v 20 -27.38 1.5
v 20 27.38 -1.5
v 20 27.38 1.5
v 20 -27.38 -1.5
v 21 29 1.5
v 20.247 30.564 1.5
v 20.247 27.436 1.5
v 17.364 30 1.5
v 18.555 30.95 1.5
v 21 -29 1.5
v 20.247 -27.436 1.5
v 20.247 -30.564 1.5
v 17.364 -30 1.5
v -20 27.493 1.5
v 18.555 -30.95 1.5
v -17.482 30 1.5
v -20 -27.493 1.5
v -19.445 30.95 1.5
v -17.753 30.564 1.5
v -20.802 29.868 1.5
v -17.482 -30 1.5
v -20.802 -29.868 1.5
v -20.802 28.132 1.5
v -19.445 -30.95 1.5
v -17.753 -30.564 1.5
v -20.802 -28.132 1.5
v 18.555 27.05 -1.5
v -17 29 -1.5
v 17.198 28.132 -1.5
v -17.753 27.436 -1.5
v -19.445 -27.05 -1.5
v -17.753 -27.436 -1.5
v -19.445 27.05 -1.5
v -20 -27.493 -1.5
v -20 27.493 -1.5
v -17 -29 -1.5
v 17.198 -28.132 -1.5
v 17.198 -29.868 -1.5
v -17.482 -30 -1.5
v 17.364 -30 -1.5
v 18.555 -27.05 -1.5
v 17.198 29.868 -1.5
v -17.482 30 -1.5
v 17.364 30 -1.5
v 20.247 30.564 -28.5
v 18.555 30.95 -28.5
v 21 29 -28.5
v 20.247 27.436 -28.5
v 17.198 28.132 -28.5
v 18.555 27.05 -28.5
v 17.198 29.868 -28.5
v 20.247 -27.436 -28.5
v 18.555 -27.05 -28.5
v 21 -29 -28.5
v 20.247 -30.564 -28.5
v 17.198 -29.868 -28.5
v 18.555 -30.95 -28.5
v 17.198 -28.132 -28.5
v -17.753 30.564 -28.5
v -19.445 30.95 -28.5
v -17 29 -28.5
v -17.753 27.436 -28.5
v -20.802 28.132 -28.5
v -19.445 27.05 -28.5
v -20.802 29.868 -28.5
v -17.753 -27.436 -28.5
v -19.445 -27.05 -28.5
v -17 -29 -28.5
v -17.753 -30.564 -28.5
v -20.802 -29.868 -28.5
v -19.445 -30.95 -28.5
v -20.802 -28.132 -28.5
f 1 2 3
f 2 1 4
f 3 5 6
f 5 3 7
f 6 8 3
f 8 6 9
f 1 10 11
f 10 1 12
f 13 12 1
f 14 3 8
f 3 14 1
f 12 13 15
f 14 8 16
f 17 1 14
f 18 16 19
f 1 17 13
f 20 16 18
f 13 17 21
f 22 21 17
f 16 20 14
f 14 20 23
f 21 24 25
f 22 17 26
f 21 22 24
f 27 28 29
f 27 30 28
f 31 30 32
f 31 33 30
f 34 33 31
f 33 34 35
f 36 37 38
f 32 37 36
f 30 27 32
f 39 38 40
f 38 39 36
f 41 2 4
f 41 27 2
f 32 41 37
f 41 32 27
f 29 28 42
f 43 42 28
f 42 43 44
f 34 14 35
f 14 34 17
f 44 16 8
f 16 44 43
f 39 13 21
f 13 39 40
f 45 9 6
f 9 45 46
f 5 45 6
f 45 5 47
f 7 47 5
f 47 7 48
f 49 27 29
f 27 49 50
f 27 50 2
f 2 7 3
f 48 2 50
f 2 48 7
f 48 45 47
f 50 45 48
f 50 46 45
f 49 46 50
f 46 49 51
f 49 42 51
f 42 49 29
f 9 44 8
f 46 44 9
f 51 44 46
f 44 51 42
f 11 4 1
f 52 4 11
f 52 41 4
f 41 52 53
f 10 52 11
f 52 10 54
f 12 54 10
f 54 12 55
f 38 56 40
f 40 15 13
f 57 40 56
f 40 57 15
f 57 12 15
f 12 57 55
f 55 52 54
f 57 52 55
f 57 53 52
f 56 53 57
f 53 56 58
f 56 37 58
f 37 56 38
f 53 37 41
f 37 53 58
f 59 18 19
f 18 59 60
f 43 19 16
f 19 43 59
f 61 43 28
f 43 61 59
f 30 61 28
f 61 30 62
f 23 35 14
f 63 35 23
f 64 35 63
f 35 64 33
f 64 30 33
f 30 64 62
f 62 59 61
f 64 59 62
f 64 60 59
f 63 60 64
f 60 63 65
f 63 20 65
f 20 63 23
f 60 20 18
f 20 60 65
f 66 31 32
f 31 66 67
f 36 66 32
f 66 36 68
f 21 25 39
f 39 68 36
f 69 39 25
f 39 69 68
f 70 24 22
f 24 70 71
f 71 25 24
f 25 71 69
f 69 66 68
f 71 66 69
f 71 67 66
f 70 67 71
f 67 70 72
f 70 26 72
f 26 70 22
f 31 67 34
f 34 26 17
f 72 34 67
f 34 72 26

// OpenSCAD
table_width = 40;
table_depth = 60;
table_height = 3;
leg_height = 30;
leg_radius = 2;

// Tabletop
cube([table_width, table_depth, table_height], center=true);


// Legs
leg_dx = table_width / 2 - leg_radius / 2;
leg_dy = table_depth / 2 - leg_radius / 2;
leg_dz = leg_height / 2 - table_height / 2;
translate([leg_dx, leg_dy, -leg_dz])
    cylinder(h=leg_height, r=leg_radius, center=true);
translate([leg_dx, -leg_dy, -leg_dz]) 
    cylinder(h=leg_height, r=leg_radius, center=true);
translate([-leg_dx, leg_dy, -leg_dz]) 
    cylinder(h=leg_height, r=leg_radius, center=true);
translate([-leg_dx, -leg_dy, -leg_dz]) 
    cylinder(h=leg_height, r=leg_radius, center=true);
